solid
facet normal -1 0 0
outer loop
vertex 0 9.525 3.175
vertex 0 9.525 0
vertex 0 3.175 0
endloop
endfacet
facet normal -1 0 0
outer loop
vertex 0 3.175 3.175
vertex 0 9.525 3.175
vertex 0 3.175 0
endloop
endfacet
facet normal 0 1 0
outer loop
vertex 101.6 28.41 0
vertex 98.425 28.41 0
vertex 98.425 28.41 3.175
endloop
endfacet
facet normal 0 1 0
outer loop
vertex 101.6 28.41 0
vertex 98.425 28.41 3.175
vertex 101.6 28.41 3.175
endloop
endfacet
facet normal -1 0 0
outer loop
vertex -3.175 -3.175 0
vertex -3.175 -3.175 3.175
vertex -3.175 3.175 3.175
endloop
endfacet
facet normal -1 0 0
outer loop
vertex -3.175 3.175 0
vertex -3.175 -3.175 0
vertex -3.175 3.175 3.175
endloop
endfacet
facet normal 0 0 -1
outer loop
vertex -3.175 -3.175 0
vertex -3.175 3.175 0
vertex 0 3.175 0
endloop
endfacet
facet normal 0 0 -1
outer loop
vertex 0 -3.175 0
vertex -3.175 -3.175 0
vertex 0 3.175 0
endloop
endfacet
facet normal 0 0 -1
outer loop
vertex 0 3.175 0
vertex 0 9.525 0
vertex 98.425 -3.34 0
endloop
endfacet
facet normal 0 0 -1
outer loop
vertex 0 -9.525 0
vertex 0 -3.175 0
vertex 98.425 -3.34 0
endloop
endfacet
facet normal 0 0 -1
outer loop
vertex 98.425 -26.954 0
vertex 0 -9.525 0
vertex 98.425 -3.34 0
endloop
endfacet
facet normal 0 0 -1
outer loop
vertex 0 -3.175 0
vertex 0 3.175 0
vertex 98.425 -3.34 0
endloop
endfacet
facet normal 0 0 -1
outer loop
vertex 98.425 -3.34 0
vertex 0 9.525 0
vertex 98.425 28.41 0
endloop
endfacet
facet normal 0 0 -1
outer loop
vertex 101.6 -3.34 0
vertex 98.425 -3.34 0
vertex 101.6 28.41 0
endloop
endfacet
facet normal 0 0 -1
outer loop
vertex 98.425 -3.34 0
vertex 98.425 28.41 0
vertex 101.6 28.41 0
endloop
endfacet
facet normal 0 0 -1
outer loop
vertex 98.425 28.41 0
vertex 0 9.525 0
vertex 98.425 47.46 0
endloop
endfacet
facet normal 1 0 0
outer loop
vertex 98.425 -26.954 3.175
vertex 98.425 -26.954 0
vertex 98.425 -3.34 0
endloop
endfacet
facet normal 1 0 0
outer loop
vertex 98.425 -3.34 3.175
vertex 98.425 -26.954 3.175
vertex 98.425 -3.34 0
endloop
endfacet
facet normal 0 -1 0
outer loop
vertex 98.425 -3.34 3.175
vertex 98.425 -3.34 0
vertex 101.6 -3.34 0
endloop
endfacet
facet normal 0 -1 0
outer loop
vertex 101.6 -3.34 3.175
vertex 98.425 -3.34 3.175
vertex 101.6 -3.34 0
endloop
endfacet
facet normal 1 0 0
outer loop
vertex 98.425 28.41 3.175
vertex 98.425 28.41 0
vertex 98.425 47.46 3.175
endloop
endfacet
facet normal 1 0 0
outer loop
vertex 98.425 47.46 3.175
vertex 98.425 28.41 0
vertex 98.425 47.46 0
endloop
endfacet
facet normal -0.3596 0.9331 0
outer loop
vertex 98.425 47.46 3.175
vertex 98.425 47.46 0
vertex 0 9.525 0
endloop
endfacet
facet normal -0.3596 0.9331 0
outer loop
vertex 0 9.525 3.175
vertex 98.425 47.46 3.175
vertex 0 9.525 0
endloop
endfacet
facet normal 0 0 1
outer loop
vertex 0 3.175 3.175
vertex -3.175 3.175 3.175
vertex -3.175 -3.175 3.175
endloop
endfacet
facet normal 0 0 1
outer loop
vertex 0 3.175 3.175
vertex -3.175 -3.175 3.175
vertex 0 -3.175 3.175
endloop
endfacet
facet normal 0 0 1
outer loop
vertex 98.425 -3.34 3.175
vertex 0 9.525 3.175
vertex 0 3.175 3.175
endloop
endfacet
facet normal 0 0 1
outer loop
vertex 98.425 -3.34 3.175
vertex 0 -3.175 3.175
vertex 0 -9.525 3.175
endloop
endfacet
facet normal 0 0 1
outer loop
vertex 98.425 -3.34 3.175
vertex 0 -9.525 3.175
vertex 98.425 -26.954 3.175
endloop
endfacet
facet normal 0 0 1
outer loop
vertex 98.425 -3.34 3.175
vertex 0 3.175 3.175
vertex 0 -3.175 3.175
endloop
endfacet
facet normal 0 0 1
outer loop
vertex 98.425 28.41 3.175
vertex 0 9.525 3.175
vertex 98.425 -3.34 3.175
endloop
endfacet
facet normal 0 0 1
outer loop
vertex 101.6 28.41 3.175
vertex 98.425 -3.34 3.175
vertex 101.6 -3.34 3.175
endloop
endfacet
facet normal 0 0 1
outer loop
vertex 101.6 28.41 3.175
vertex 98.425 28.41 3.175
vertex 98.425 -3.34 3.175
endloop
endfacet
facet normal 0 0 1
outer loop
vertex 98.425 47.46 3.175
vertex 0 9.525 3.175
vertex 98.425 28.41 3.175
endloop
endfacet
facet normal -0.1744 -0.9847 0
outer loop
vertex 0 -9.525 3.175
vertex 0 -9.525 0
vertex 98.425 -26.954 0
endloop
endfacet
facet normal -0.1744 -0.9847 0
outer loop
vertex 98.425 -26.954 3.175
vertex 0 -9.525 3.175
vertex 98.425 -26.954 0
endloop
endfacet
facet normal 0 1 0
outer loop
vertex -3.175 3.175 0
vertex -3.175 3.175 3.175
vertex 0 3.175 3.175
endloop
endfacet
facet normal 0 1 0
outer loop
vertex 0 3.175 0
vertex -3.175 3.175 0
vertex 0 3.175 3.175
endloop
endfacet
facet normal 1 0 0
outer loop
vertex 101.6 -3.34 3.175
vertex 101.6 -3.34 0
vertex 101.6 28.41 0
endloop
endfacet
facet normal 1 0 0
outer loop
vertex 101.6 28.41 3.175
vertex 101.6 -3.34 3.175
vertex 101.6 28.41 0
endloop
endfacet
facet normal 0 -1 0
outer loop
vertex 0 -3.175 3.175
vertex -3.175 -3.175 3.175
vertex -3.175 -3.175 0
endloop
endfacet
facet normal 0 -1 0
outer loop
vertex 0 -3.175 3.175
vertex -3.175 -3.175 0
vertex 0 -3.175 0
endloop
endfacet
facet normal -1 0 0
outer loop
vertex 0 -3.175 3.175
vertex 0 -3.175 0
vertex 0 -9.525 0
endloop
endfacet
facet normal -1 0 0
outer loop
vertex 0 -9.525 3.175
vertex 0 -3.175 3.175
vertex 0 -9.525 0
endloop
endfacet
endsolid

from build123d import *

# Parameters (mm, degrees)
SKETCH1_W           = 3.175
SKETCH1_H           = 31.75
BOSS_EXTRUDE2_DEPTH = 3.175
SKETCH2_W           = 3.175
SKETCH2_H           = 6.35
BOSS_EXTRUDE3_DEPTH = 3.175


with BuildPart() as part:
    # Sketch1 → Boss-Extrude2 (new body)
    with BuildSketch(Plane.XY):
        Polygon((0, 9.525), (0, -9.525), (98.425, -26.954443488), (98.425, -3.340380987), (98.425, 28.409619013), (98.425, 47.459619012), align=None)
        with Locations((100.0125, 12.534619013)):
            Rectangle(SKETCH1_W, SKETCH1_H)
    extrude(amount=BOSS_EXTRUDE2_DEPTH)

    # Sketch2 → Boss-Extrude3 (add)
    with BuildSketch(Plane.XY.offset(3.175)):
        with Locations((-1.5875, 0)):
            Rectangle(SKETCH2_W, SKETCH2_H)
    extrude(amount=-BOSS_EXTRUDE3_DEPTH)


solid = part.part
